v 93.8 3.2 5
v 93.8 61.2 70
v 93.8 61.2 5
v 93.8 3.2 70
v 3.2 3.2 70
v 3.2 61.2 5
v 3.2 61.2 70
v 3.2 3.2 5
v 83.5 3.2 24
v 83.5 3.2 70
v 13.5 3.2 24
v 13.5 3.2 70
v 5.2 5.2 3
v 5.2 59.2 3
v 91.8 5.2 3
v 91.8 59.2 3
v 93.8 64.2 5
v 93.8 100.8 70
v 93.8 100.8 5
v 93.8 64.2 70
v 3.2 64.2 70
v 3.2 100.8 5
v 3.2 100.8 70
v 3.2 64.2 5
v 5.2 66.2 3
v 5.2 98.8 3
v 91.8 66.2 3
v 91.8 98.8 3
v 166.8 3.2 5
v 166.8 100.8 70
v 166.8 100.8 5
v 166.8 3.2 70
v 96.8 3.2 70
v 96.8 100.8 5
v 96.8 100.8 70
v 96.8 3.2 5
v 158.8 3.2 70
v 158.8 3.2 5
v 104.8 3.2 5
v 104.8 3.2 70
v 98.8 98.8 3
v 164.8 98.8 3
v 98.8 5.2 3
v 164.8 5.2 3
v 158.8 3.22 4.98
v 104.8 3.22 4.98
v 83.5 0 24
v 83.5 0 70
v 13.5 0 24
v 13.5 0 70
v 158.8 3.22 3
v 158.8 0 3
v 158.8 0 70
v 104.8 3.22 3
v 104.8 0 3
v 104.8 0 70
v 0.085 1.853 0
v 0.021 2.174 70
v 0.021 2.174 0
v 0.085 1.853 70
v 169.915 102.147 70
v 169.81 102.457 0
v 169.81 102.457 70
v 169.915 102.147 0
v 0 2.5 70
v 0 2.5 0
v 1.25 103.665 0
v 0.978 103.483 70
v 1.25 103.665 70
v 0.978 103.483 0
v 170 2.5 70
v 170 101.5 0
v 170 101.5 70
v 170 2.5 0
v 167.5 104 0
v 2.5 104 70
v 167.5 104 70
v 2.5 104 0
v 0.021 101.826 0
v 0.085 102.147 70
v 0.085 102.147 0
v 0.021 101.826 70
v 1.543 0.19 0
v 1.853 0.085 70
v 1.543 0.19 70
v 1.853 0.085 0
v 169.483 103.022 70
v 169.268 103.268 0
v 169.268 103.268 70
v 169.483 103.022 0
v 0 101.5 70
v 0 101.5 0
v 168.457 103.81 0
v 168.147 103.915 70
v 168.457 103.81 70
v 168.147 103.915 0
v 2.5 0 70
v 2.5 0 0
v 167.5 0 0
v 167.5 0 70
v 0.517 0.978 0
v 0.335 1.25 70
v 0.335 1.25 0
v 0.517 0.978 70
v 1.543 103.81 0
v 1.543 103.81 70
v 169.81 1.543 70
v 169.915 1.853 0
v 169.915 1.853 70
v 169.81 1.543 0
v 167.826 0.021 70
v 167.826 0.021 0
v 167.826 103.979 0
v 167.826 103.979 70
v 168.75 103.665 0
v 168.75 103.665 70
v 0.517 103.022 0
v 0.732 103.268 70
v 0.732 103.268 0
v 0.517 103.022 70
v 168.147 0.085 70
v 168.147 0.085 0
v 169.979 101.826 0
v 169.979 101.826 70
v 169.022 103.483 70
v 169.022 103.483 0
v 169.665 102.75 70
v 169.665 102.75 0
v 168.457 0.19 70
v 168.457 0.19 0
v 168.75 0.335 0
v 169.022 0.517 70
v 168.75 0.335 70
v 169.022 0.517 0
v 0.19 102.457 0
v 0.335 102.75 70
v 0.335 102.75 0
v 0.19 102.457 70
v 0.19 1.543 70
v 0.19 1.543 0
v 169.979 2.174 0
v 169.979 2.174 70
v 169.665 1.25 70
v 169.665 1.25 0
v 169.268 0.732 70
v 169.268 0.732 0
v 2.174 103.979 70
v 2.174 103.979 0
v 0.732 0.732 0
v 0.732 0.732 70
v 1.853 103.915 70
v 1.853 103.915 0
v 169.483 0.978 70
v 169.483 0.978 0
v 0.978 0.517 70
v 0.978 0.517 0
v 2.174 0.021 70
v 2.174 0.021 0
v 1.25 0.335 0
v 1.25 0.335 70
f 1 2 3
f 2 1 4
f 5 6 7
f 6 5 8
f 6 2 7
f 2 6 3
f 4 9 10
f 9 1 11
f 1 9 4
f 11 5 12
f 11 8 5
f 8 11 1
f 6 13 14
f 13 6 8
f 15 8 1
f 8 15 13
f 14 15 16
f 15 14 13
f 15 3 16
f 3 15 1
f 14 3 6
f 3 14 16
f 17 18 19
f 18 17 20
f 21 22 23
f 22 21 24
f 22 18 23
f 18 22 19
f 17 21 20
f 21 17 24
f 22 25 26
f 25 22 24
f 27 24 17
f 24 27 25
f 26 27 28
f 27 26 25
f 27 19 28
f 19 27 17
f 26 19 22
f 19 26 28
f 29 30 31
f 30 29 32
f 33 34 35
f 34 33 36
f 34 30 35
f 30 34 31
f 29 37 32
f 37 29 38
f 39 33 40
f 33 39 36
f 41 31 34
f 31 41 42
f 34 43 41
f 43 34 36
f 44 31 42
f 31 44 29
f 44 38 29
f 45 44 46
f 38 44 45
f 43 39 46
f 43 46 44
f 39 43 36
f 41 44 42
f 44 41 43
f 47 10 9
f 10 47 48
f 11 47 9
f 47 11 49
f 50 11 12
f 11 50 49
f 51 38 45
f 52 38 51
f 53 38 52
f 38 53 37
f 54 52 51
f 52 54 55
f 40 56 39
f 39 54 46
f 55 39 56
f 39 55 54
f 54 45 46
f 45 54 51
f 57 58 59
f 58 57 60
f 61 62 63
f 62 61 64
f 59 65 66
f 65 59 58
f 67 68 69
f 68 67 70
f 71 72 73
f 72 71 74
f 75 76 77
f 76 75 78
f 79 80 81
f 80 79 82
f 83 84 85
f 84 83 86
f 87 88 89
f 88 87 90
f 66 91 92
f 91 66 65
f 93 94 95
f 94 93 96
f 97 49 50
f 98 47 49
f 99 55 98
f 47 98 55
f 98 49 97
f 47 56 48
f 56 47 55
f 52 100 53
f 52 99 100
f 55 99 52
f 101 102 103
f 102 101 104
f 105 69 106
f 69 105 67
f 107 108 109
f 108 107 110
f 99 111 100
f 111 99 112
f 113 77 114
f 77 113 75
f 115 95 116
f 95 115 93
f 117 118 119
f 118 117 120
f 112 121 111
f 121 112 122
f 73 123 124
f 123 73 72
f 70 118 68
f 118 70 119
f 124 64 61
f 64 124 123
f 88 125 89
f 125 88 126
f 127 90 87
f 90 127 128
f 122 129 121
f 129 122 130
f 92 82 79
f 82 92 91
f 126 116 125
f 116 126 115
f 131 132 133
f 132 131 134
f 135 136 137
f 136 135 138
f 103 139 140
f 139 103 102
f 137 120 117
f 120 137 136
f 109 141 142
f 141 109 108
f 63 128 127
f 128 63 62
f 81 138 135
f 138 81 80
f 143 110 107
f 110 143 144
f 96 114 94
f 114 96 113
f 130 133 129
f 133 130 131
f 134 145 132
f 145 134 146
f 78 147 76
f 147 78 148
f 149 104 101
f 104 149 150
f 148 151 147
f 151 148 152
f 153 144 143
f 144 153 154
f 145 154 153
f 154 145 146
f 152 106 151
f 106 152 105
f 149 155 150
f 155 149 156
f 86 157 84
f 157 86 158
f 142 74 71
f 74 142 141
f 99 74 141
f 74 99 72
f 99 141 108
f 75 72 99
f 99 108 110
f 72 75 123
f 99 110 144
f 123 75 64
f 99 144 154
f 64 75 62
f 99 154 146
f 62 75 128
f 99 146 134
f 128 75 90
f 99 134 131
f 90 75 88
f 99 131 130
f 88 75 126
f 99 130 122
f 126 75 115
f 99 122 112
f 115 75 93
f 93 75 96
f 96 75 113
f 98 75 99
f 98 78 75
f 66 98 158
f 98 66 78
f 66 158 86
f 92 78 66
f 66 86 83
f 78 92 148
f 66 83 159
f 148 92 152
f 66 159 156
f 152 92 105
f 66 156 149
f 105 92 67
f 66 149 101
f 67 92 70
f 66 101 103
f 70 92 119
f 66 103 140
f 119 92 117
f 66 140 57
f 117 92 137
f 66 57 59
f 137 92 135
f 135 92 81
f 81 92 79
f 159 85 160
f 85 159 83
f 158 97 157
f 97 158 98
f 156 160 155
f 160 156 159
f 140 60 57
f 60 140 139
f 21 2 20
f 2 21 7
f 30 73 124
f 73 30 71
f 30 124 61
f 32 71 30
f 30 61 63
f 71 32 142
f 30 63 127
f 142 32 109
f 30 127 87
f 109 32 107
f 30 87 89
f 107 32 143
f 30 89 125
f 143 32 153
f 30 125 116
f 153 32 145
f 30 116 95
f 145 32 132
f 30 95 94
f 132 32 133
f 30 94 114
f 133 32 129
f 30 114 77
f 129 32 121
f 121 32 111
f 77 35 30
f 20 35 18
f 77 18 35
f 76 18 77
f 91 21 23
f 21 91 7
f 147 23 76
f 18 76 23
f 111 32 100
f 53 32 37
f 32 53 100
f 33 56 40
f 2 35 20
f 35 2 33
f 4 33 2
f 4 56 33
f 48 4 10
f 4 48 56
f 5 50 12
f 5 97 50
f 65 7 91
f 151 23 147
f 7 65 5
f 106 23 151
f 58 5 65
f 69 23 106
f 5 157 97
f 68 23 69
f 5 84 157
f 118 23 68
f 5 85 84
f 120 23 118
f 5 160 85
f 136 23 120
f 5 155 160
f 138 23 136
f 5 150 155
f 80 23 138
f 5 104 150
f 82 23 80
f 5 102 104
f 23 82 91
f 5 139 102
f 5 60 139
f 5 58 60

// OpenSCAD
// =============================================================================
// COLD SNAP DESK CADDY
// Layout:
//   - Left-front bay: Sized for toploaders/sleeves with a mid-height retaining lip
//   - Left-rear bay: Full-height slot for semi-rigids
//   - Right bay: Full-depth slot for penny sleeves with a floor-level cutout
// =============================================================================

$fn = 48;
EPS = 0.02;

// --- Primary Dimensions ---
BOX_W = 170.0; // Overall width (X)
BOX_D = 104.0; // Overall depth (Y)
BOX_H = 70.0; // Rear/side wall height (Z)

WALL_T = 3.2; // Exterior perimeter wall thickness
DIVIDER_T = 3.0; // Internal divider thickness
FLOOR_T = 3.0; // Bottom floor thickness
OUTER_R = 2.5; // Exterior corner fillet radius

// --- Calibrated Compartment Widths & Depths ---
RIGHT_BAY_W = 70.0; // Sized for 67mm penny sleeves (+3.0mm clearance)
LEFT_FRONT_D = 58.0;

// --- Front Cutout Geometry
LEFT_LIP_H = 24.0;
LEFT_NOTCH_W = 70.0; // Widened opening for comfortable finger grab on toploaders

RIGHT_NOTCH_W = 54.0; // Widened floor-level scoop for penny sleeves
RIGHT_POST_W = 8.0;

// --- Internal Derived Variables ---
AVAIL_X = BOX_W - (2 * WALL_T) - DIVIDER_T;
LEFT_BAY_W = AVAIL_X - RIGHT_BAY_W;

AVAIL_Y = BOX_D - (2 * WALL_T);
RIGHT_BAY_D = AVAIL_Y;
LEFT_REAR_D = AVAIL_Y - LEFT_FRONT_D - DIVIDER_T;

// Sub-Module: 2D Rounded Perimeter Base
module rounded_rect_2d(width, depth, radius) {
  hull() {
    for (dx = [radius, width - radius]) {
      for (dy = [radius, depth - radius]) {
        translate([dx, dy]) circle(r=radius);
      }
    }
  }
}

// Sub-Module: Chamfered Internal Cavity Cutter
module pocket_cutter(width, depth, height, chamfer = 2.0) {
  translate([0, 0, chamfer])
    cube([width, depth, height - chamfer + 2 * EPS]);

  hull() {
    translate([chamfer, chamfer, 0])
      cube([width - 2 * chamfer, depth - 2 * chamfer, EPS]);
    translate([0, 0, chamfer])
      cube([width, depth, EPS]);
  }
}

// Sub-Module: Front Face Pass-Through Windows
module front_cutouts() {
  // 1. Left Front Bay Window (stops at retaining lip)
  translate([WALL_T + (LEFT_BAY_W - LEFT_NOTCH_W) / 2, -EPS, LEFT_LIP_H])
    cube([LEFT_NOTCH_W, WALL_T + 2 * EPS, BOX_H]);

  // 2. Right Bay Window (cuts down to floor plate)
  x_right_start = WALL_T + LEFT_BAY_W + DIVIDER_T;
  translate([x_right_start + (RIGHT_BAY_W - RIGHT_NOTCH_W - RIGHT_POST_W), -EPS, FLOOR_T])
    cube([RIGHT_NOTCH_W, WALL_T + 2 * EPS, BOX_H]);
}

// Top-Level Solid Assembly
module cold_snap_desk_caddy() {
  difference() {
    // Outer Solid Shell
    linear_extrude(height=BOX_H)
      rounded_rect_2d(BOX_W, BOX_D, OUTER_R);

    // 1. Left Front Bay Cavity (Toploaders)
    translate([WALL_T, WALL_T, FLOOR_T])
      pocket_cutter(LEFT_BAY_W, LEFT_FRONT_D, BOX_H - FLOOR_T);

    // 2. Left Rear Bay Cavity (Semi-Rigids)
    y_left_rear = WALL_T + LEFT_FRONT_D + DIVIDER_T;
    translate([WALL_T, y_left_rear, FLOOR_T])
      pocket_cutter(LEFT_BAY_W, LEFT_REAR_D, BOX_H - FLOOR_T);

    // 3. Right Bay Cavity (Full-depth for Penny Sleeves)
    x_right = WALL_T + LEFT_BAY_W + DIVIDER_T;
    translate([x_right, WALL_T, FLOOR_T])
      pocket_cutter(RIGHT_BAY_W, RIGHT_BAY_D, BOX_H - FLOOR_T);

    // 4. Front Face Cutouts
    front_cutouts();
  }
}

cold_snap_desk_caddy();
